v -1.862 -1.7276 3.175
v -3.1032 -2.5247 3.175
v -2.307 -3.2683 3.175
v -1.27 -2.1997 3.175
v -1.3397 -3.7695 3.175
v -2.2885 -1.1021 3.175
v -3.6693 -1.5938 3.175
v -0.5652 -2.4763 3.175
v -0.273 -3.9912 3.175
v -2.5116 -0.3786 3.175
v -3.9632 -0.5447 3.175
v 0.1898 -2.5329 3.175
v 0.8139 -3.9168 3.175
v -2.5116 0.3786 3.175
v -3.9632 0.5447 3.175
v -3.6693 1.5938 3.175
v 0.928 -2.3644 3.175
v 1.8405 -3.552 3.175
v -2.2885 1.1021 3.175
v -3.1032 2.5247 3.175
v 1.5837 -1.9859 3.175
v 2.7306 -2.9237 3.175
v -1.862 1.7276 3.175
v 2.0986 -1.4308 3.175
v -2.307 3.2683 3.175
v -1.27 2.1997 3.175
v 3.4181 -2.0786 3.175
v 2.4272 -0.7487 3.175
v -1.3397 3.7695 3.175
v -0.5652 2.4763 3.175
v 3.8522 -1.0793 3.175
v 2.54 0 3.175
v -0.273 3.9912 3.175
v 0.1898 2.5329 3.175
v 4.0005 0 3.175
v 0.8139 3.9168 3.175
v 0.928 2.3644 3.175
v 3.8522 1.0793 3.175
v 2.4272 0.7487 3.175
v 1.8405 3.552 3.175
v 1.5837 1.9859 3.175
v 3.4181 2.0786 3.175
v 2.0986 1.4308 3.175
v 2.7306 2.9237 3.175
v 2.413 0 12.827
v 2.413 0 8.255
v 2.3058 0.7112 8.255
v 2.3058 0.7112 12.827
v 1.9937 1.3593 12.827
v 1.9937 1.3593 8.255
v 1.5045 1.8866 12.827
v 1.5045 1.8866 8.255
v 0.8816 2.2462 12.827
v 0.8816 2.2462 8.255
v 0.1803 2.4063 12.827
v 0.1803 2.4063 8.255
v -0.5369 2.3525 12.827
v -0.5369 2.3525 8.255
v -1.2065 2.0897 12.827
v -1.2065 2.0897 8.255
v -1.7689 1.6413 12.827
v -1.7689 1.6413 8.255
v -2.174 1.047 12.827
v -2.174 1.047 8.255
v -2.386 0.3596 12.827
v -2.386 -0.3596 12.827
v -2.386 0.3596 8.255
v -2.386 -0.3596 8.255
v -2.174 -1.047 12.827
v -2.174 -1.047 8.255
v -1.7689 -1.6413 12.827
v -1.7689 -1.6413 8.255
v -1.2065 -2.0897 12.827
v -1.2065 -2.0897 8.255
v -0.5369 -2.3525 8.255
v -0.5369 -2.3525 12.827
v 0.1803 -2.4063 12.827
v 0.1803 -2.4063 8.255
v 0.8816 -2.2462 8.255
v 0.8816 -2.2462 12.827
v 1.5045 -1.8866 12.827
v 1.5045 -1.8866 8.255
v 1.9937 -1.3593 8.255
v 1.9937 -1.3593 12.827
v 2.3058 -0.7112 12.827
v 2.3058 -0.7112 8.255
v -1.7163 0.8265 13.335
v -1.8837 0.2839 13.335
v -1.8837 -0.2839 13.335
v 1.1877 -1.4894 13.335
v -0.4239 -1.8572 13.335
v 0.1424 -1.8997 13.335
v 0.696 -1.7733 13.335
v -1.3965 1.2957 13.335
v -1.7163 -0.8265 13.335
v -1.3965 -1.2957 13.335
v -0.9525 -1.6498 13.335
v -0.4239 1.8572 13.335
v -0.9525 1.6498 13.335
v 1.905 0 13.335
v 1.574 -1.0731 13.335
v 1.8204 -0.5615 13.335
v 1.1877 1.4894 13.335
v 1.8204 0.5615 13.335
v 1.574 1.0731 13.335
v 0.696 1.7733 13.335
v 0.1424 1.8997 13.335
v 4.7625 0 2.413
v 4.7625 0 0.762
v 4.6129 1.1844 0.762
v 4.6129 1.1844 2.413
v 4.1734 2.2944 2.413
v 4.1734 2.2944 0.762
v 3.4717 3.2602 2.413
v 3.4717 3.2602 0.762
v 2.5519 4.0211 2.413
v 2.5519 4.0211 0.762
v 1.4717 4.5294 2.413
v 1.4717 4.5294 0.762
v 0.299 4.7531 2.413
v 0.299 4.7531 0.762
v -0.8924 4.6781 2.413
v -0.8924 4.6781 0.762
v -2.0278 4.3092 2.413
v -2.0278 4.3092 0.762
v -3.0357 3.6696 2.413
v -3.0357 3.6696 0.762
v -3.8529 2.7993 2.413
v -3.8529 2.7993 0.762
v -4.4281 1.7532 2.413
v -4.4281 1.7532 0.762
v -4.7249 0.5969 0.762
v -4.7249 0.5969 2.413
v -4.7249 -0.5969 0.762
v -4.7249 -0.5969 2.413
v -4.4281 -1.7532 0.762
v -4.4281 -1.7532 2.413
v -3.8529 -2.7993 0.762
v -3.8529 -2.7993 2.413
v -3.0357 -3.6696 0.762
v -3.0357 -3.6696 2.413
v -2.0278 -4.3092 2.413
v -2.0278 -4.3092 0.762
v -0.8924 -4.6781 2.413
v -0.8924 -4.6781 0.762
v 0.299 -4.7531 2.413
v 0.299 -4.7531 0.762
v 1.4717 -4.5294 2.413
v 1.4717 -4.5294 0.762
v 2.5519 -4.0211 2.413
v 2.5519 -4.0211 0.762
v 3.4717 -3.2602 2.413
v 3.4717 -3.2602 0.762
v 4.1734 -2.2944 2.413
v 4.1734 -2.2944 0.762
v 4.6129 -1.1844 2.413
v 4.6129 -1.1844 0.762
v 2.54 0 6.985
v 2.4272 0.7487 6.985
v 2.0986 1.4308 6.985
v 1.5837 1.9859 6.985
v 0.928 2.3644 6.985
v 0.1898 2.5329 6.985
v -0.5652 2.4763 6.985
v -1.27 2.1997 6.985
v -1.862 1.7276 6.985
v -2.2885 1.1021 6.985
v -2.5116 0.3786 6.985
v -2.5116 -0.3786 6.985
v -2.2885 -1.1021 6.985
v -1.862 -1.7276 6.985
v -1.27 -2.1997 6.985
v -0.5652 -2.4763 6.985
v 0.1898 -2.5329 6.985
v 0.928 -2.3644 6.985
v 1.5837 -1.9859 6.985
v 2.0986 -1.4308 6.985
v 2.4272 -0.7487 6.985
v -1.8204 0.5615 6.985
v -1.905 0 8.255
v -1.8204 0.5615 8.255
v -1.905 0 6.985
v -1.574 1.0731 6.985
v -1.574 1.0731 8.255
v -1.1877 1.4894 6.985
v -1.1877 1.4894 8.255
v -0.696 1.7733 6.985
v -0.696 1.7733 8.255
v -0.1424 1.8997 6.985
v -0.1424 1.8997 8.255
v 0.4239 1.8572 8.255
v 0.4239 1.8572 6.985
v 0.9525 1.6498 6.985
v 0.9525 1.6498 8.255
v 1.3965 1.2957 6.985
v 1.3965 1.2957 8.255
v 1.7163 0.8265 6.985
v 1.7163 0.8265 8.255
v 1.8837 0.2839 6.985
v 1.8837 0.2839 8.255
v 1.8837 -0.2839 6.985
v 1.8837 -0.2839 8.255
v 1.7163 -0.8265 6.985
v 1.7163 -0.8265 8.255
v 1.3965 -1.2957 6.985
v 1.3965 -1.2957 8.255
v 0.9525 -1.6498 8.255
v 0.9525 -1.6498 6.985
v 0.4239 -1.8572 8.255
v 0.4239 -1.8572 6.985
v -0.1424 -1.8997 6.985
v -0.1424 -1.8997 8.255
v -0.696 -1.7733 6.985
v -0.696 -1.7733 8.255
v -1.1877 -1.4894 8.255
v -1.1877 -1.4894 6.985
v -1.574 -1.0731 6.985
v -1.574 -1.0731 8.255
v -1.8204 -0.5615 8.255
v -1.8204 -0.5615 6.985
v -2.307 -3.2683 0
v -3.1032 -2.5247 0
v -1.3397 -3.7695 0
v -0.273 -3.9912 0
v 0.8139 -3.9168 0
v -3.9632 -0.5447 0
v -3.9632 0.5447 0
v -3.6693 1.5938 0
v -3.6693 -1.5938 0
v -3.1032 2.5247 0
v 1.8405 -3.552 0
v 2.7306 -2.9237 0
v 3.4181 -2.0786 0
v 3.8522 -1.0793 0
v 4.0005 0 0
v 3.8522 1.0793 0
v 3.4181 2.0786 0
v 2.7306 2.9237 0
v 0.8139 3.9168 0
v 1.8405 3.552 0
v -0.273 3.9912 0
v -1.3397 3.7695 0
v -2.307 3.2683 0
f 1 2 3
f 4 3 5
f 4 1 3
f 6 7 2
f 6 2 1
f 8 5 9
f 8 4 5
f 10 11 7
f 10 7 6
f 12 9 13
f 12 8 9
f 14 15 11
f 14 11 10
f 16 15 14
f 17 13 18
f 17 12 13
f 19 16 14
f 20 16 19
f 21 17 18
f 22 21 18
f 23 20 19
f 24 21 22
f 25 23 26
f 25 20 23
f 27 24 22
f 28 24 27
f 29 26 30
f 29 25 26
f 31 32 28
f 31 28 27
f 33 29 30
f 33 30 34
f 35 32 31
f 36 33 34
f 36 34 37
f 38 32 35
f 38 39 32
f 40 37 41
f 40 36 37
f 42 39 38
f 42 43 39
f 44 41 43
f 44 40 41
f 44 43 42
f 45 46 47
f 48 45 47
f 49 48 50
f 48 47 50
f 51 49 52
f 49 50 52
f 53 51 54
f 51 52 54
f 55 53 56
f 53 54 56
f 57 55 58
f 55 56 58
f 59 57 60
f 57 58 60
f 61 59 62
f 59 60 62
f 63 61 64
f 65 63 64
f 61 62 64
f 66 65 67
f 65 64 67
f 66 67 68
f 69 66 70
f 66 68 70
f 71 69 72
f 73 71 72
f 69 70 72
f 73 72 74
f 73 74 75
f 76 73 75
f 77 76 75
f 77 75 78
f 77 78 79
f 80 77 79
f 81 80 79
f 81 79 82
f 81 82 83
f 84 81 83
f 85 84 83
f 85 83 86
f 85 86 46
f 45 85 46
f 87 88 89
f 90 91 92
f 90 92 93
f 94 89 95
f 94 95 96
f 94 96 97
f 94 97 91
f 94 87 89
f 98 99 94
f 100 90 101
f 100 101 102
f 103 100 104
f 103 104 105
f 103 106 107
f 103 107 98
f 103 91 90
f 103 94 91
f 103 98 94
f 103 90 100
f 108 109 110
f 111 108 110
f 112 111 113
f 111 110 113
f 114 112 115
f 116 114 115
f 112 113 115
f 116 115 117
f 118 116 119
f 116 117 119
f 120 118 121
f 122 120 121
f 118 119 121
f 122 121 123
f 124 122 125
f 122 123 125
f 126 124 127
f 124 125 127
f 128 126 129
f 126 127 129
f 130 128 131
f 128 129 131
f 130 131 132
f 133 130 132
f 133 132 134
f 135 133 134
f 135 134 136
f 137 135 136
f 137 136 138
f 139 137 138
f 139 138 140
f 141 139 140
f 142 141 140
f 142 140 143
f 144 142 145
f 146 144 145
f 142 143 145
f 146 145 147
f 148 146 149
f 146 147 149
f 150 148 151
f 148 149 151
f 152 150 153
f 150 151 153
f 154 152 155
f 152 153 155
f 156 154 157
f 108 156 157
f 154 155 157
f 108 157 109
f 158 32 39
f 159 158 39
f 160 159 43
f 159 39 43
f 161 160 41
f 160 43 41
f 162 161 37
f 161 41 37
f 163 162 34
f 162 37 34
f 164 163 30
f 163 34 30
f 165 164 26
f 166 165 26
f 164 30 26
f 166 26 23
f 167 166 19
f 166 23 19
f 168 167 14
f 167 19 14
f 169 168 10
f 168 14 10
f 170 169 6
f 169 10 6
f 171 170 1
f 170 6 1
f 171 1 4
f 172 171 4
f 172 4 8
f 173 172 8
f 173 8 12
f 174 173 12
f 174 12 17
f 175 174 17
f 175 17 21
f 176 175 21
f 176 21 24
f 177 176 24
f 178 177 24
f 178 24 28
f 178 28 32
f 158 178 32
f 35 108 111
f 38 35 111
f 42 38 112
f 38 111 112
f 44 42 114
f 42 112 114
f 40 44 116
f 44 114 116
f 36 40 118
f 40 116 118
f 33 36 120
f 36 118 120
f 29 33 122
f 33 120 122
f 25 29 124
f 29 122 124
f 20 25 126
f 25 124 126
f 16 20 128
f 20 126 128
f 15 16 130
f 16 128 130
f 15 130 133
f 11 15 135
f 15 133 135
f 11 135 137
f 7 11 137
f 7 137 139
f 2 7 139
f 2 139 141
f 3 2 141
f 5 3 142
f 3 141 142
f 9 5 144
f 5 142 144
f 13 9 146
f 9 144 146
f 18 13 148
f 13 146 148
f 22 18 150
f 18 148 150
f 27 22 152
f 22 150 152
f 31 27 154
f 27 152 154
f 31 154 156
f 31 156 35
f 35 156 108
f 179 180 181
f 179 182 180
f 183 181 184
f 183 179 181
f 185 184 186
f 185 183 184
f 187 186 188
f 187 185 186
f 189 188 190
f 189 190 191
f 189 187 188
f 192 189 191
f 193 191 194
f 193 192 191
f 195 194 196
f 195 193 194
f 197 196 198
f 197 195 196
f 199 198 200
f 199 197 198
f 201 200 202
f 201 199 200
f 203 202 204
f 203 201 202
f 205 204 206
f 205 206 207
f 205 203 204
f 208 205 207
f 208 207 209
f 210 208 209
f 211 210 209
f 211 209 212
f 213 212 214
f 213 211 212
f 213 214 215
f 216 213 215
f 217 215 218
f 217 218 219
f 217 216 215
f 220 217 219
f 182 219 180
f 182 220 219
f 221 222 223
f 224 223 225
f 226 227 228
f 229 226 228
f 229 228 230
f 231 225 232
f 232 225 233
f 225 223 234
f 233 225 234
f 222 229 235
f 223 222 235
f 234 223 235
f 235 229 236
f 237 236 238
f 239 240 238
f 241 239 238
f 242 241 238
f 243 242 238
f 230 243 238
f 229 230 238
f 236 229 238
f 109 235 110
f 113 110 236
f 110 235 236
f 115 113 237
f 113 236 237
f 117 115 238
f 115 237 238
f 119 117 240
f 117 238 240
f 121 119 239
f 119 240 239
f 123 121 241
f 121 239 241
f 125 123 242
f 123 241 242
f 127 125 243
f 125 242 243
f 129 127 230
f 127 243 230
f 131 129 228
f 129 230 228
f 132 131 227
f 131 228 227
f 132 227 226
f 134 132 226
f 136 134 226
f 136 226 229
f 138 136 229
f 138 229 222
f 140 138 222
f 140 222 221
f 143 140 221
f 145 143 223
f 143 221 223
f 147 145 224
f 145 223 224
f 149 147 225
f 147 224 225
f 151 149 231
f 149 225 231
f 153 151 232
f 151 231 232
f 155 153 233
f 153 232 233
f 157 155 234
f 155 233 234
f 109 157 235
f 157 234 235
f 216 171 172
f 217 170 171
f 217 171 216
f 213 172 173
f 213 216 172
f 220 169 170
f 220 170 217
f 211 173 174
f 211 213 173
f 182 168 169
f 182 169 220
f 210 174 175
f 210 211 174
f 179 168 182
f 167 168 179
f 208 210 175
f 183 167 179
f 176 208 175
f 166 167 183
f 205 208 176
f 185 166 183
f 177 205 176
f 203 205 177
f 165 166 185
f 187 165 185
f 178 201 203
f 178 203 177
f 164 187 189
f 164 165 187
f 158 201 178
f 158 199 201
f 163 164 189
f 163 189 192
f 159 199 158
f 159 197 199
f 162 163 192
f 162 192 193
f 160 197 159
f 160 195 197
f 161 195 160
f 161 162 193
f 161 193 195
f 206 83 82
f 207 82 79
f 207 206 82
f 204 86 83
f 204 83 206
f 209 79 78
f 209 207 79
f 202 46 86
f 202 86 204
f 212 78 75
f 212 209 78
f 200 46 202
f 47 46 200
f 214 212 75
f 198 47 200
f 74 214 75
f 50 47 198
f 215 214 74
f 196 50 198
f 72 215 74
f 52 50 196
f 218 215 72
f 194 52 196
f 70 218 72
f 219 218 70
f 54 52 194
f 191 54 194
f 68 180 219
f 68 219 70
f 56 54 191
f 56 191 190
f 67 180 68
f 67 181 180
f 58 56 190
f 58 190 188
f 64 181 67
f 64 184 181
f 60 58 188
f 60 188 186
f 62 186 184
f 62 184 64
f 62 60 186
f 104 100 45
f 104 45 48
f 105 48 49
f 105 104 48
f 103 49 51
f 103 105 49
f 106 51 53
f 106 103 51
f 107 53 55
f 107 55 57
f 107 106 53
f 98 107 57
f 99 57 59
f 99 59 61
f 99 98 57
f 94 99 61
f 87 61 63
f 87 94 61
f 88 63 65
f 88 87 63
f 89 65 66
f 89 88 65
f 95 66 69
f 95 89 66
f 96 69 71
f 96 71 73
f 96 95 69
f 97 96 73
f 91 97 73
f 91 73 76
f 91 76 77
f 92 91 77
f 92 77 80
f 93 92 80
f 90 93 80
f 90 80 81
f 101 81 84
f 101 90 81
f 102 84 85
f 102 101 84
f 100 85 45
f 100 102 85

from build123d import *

# Parameters (mm, degrees)
SKETCH1_R           = 4.7625
BOSS_EXTRUDE1_DEPTH = 3.175
SKETCH2_R           = 2.54
BOSS_EXTRUDE2_DEPTH = 3.81
SKETCH3_R           = 2.413
BOSS_EXTRUDE3_DEPTH = 6.35
CHAMFER1_SIZE       = 0.508
SKETCH8_W           = 0.635
SKETCH8_H           = 1.27
CHAMFER2_SIZE       = 0.762


with BuildPart() as part:
    # Sketch1 → Boss-Extrude1 (new body)
    with BuildSketch(Plane.XY):
        Circle(SKETCH1_R)
    extrude(amount=BOSS_EXTRUDE1_DEPTH)

    # Sketch2 → Boss-Extrude2 (add)
    with BuildSketch(Plane.XY.offset(3.175)):
        Circle(SKETCH2_R)
    extrude(amount=BOSS_EXTRUDE2_DEPTH)

    # Sketch3 → Boss-Extrude3 (add)
    with BuildSketch(Plane.XY.offset(6.985)):
        Circle(SKETCH3_R)
    extrude(amount=BOSS_EXTRUDE3_DEPTH)

    # Chamfer1
    chamfer1_edges = [part.edges().sort_by_distance(p)[0] for p in [
        (-2.413, 0, 13.335),
    ]]
    chamfer(chamfer1_edges, length=CHAMFER1_SIZE)

    # Sketch8 → Cut-Revolve1 (revolve, cut)
    with BuildSketch(Plane(origin=(0, 0, 0), x_dir=(1, 0, 0), z_dir=(0, 1, 0))):
        with Locations((-2.2225, -7.62)):
            Rectangle(SKETCH8_W, SKETCH8_H)
    revolve(axis=Axis((0, 0, 23.053781971), (0, 0, -1)), mode=Mode.SUBTRACT)

    # Chamfer2
    chamfer2_edges = [part.edges().sort_by_distance(p)[0] for p in [
        (-4.7625, 0, 0),
        (-4.7625, 0, 3.175),
    ]]
    chamfer(chamfer2_edges, length=CHAMFER2_SIZE)


solid = part.part
